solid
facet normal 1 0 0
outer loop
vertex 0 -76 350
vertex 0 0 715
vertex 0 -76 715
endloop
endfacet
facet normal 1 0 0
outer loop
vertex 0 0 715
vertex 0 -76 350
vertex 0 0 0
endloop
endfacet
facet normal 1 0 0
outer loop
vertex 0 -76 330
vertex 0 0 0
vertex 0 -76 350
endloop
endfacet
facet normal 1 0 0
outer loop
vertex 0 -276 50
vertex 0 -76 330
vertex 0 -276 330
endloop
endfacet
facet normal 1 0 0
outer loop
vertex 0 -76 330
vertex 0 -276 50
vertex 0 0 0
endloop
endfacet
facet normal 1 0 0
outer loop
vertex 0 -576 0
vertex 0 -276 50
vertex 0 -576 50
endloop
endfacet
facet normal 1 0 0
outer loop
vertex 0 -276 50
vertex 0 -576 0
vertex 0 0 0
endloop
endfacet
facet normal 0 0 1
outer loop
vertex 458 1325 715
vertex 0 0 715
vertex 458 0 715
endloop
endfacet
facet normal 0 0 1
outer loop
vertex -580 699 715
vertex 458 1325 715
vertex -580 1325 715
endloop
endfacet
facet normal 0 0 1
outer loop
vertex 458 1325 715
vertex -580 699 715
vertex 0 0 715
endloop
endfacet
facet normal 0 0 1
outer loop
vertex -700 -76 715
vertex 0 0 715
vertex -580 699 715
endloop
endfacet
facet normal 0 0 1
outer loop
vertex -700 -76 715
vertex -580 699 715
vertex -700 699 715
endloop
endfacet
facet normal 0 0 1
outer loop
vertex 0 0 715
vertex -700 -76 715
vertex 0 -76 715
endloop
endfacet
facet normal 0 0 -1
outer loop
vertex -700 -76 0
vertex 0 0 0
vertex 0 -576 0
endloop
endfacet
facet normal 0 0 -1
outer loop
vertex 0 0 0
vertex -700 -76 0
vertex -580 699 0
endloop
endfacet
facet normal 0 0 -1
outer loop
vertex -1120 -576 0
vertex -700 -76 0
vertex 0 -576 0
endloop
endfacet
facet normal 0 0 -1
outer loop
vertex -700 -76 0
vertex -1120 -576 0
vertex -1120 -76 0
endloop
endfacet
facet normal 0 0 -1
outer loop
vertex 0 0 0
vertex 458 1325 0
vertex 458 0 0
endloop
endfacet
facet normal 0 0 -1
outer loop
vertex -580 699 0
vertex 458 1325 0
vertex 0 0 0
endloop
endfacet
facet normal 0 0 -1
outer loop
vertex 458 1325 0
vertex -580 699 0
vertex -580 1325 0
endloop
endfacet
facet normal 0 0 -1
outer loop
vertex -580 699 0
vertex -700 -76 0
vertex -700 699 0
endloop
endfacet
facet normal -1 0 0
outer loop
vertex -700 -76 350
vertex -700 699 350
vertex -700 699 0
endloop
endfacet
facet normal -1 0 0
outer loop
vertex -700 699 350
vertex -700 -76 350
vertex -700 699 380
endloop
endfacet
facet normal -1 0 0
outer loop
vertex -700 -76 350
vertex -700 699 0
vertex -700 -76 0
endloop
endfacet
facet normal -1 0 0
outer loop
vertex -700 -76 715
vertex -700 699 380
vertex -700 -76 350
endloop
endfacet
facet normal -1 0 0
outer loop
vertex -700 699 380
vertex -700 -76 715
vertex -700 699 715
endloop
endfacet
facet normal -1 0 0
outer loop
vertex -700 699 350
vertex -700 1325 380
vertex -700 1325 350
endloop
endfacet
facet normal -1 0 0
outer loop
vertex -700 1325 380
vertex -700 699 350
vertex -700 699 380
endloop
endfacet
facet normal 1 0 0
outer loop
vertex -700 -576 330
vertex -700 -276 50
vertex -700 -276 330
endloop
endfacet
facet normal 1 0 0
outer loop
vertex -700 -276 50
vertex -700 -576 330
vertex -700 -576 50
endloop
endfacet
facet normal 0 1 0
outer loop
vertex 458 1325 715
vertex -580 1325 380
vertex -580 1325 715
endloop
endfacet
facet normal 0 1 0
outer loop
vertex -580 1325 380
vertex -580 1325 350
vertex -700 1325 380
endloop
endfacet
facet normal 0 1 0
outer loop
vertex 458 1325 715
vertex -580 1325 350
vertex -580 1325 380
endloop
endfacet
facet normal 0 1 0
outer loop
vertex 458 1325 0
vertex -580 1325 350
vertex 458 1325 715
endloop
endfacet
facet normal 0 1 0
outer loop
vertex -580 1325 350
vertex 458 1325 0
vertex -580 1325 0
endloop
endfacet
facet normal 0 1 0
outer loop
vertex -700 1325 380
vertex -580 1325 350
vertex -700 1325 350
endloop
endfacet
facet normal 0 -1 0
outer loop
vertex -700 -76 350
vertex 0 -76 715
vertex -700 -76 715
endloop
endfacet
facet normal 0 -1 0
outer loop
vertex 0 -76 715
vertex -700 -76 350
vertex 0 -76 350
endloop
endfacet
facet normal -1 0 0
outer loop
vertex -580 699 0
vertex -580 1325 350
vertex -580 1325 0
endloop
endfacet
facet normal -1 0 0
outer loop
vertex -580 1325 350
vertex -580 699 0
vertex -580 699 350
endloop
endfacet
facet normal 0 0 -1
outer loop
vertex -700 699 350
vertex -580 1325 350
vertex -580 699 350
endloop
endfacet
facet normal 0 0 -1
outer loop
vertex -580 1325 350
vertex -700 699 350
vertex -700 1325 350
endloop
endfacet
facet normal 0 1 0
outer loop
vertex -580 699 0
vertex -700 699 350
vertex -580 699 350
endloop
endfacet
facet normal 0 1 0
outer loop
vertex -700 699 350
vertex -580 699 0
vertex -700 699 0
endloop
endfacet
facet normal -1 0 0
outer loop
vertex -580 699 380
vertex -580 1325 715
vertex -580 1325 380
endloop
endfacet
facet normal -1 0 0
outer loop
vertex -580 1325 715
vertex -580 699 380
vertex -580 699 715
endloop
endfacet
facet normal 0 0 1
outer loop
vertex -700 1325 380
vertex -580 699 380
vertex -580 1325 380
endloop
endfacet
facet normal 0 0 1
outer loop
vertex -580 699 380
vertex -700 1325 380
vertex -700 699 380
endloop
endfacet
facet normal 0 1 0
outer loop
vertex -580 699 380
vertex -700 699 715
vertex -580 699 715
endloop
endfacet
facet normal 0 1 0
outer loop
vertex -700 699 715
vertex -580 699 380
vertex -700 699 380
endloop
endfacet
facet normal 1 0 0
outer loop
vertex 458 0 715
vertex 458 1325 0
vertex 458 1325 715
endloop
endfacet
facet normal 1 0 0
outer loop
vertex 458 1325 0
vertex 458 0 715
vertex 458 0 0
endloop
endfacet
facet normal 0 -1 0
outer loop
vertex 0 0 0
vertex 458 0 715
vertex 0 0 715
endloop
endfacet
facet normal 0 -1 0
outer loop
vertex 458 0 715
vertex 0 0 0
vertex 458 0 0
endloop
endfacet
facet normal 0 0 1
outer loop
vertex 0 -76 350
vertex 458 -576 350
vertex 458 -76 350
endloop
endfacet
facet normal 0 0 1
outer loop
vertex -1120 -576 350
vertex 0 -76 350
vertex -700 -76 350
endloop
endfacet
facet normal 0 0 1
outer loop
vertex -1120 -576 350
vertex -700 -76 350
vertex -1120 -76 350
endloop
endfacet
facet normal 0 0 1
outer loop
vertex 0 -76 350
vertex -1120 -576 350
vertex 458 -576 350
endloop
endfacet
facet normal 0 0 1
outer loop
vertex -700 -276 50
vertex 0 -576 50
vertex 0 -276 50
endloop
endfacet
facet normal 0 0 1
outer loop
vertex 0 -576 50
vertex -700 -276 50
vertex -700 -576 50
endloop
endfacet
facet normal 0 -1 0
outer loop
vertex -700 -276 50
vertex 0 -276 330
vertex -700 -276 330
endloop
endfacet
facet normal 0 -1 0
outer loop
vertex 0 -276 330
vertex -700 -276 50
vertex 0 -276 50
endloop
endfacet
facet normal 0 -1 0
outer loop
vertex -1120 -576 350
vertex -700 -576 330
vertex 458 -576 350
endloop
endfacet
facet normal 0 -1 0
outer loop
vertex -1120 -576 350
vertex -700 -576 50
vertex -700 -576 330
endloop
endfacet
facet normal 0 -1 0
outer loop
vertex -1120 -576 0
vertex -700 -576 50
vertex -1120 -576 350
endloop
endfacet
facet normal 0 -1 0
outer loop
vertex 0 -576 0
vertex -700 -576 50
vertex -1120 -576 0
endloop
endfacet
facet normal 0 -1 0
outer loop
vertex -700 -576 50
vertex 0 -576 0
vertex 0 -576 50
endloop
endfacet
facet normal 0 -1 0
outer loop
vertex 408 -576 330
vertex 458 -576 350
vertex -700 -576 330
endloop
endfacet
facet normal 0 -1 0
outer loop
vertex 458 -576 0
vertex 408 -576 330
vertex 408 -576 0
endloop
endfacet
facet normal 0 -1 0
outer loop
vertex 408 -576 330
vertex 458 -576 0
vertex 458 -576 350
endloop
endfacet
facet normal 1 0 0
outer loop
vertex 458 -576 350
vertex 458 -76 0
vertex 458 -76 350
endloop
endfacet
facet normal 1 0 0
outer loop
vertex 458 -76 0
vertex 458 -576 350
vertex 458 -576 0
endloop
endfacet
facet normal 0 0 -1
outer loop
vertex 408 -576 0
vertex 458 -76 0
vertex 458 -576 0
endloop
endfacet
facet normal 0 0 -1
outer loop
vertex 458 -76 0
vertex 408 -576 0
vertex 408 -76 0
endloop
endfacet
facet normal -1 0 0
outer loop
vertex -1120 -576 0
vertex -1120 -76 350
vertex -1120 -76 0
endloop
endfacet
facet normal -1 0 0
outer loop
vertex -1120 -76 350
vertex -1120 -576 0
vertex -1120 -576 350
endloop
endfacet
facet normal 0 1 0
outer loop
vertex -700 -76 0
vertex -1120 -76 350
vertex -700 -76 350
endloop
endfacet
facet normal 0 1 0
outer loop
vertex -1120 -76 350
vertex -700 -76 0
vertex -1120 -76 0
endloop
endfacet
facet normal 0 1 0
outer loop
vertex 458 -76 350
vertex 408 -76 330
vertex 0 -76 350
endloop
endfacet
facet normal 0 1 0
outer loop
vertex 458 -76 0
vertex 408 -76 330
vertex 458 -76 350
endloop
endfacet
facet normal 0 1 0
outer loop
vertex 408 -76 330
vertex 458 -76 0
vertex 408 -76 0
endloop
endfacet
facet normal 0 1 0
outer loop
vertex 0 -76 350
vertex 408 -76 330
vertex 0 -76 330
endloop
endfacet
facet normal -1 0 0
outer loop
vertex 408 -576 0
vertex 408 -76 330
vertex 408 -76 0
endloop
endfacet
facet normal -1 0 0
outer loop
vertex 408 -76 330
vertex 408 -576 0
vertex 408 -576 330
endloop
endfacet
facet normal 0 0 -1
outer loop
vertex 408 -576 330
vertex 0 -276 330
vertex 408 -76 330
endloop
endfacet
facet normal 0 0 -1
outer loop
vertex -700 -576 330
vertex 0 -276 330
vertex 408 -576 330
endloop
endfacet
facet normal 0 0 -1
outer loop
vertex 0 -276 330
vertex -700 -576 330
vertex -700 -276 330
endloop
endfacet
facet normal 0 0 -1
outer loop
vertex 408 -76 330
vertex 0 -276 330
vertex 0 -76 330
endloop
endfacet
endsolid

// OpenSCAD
haz_m = 715;
haz_j_h = 1325;
haz_j_sz = 458;
haz_b_h = haz_j_h + 76;
haz_b_sz = 700;
beugro_h = 670;
beugro_sz = 120;
beugro_m = 350;

lepcso_szelesseg = 120;

apa=true;

//alsoszint();

elotetovel();


module alsoszint(){
    difference(){
        haz();
        translate([-haz_b_sz, -76, beugro_m])cube([15000,15000,400]);
        konyha();
        translate([haz_j_sz-42-416, 42+417,50])translate([])cube([416, 16+316+21+471, 350]);
        translate([-616-42, -76+42, 50])cube([616, 250,350]);  // Lépcsőház
        nappali();
        translate([-616-42, -76+42+250,50])cube([200, 42, 240]); //kivágás a lépcsőnél
        translate([-200-42, -76+42+250,50])cube([200, 42, 240]); //kivágás a bejárattal szemben
        hatso_traktus();
        bejarati_ajto();
        nappali_ajto();
        nappali_kicsi_ablakok();
        ujKonyha_ablakok();
        ujhatso_ajto();
        hatso_ajto();
        halo_ablak();
        if (apa){
            gyerekszoba_oldalablak();
        }
        gyerekszoba_hatsoablak();
        hatso_terasz();
    }
    translate([-haz_b_sz+lepcso_szelesseg+42,290-76+42,50])rotate([0,0,180])lepcso(tomor=false);
    translate([-41-200-100, -76+42+250+21, 350])cylinder(r=10, h=200);
    szennyesledobo();
}

module ujKonyha_ablakok(){
    translate([-55-483,-76+775+364+42+10,50+240])rotate([0,0,90])cube([150,42,40]);
    translate([-483,-76+haz_b_h-42,50+240])rotate([0,0,0])cube([200,42,40]);
}

module kulso_latvany(){
    difference(){
        elotetovel();
        nappali();
        nappali_ajto();
        hatso_traktus();
        nappali_kicsi_ablakok();
        bejarati_ajto();
    }
}


module konyha(){
    translate([haz_j_sz-42-416, 42,50])cube([416, 417,350]); // Konyha
}
module gyerekszoba_oldalablak(){
    translate([haz_j_sz-42,150+361+292+259-75,50])rotate([0,0,-90])cube([65,42,240]);
}

module hatso_terasz(jatszo_oldala_kiutve = true){
    if (jatszo_oldala_kiutve){
        translate([-42,-76+775+364+42,50])cube([42,178,240]);
        translate([-496-42,-76+775+364+42,50])cube([496,178,310]);
    }
    else
        translate([-496-42,-76+775+364+42,50])cube([496,178,310]);
}
module gyerekszoba_hatsoablak(){
    if (apa){
        szelso_eltolas = 38+40;//haz_j_sz-240-138;
        for(dx = [szelso_eltolas, szelso_eltolas+65+22.5, szelso_eltolas+65+22.5 +65+22.5]){
            translate([dx, -76+haz_b_h-42, 50])cube([65, 42, 240]);
        }
    }
    else{
        translate([haz_j_sz-240-138, -76+haz_b_h-42, 50])cube([240, 42, 240]);
    }
}
module ujhatso_ajto(){
    translate([-100-42-10, -76+haz_b_h-42, 50])cube([100,42,240]);
}

module hatso_ajto(){
    translate([-100-42-10, -76+haz_b_h-42-178-42, 50])cube([100,42,240]);
}

module szennyesledobo(){
    translate([285+10,42+417,0])cube([30,30,600]);
}

module halo_ablak(){ // régi konyha ablak
    for(x = [38+40, 38+40+65+22.5])
        translate([x,0,50])cube([65,42,240]);
}

module nappali_kicsi_ablakok(){
    if (apa){
        for(dy = [10,10+126,10+252]){
                translate([-55-483,-76+167+380+228+dy, 50])rotate([0,0,90])cube([65,43,240]);
        }
    }
    else{
        translate([-55-483,-76+167+380+228+86, 50])rotate([0,0,90])cube([250,43,240]);
    }
}

module nappali(){
    translate([-616-42, -76+42+250+42,50])cube([616, 401, 350]); //nappali
}

module hatso_traktus(){
    translate([-496-42,-76+42+250+42+401,50])cube([496,100+12+282+12,350]);
}

module bejarati_ajto(){
    translate([-140-96,-76,50])cube([140,42,240]); //Bejárati ajtó
}

module nappali_ajto(){
    if (apa){
        translate([-616-42,-76+42+250+145,50])rotate([0,0,90])cube([220,42,240]);
    }
    else {
        translate([-616-42,-76+42+250+145,150])rotate([0,0,90])cube([220,42,140]);
    }
}

module lepcso(tomor=true){
    
    lepcsohaz_magassag = 300;
    lepcsohaz_szelesseg = 290;
    lepcsofok_melyseg = 30;
    lepesek = 20;
    lepcsok_a_sarokban = 3;
    lepcsofok_magassag = 15;
    
    lepes_magassag = lepcsohaz_magassag / lepesek;
    n_also_lepcsok = floor((lepcsohaz_szelesseg - lepcso_szelesseg) / lepcsofok_melyseg);

    echo(n_also_lepcsok);

    // Alsó rész
    offset_a_sarok_fele = lepcsohaz_szelesseg - lepcso_szelesseg - n_also_lepcsok * lepcsofok_melyseg;// betoljuk, ha kell, ha a saroknál ne legyen extra hézag. A lépcsők számának lefele kerekítése miatt alakul ki a rés
    translate([0,offset_a_sarok_fele, 0])egyenes_lepcsok(n_also_lepcsok, teli=tomor);
    echo("Lépcsőház mérete a üvegfel oldalán: ", lepcsohaz_szelesseg - offset_a_sarok_fele);

    // Forduló
    translate([0,lepcsohaz_szelesseg - lepcso_szelesseg,(n_also_lepcsok -1)* lepes_magassag])    
        for(i = [1 : lepcsok_a_sarokban]){
            translate([0,0, i*lepes_magassag])sarok_lepcsofok(i);
        }

    // Felső lépcsők
    n_felso_lepcsok = floor((lepcsohaz_magassag - (n_also_lepcsok + lepcsok_a_sarokban) * lepes_magassag)/lepes_magassag);
    echo(n_felso_lepcsok);
    echo("Lépcsőház mérete a bejárati ajtó falán: ", lepcso_szelesseg + lepcsofok_melyseg * n_felso_lepcsok);

    translate([0,lepcsohaz_szelesseg - lepcso_szelesseg, 0]){
        translate([0,0,(n_also_lepcsok + lepcsok_a_sarokban) * lepes_magassag])
            rotate([0,0,90]) egyenes_lepcsok(n_felso_lepcsok, teli=tomor);
        if (tomor){
            also_x = n_felso_lepcsok * lepcsofok_melyseg;
            translate([-also_x,0,0])cube([also_x,lepcso_szelesseg, (n_also_lepcsok + lepcsok_a_sarokban) * lepes_magassag]);
        }
    }




    module egyenes_lepcsok(n, teli=false){
        for(i = [0: n-1]){
            if (teli) 
                translate([0, i*lepcsofok_melyseg, 0])lepcsofok(m=(i+1)*lepes_magassag);
            else
                translate([0, i*lepcsofok_melyseg, i*lepes_magassag])lepcsofok();
        }
    }


    module lepcsofok(m = lepcsofok_magassag){
        cube([lepcso_szelesseg, lepcsofok_melyseg, m]);
    }


    module sarok_lepcsofok(i){
        szog = 90 / lepcsok_a_sarokban;
        
        forgatas_szoge = (i - 1) * szog;
        szog2 = i * szog;
        elhossz = 2 * lepcso_szelesseg; // valójában a sqrt(2)-vel elég lenne szorozni. Így biztosan kilóg
        intersection(){
            cube([lepcso_szelesseg, lepcso_szelesseg, lepcsofok_magassag]);
            pontok = [[0,0],[cos(forgatas_szoge), sin(forgatas_szoge)],[cos(szog2), sin(szog2)]];
            //echo(lepcso_szelesseg * pontok[2]);
            echo(lepcso_szelesseg * tan(forgatas_szoge));
            linear_extrude(height=lepcsofok_magassag){
                polygon(points = elhossz * pontok);
            }
        }
    }
}

module elotetovel(){
    //garage_fodem_h = beugro_m - 46;
    
    haz();
    //translate([-991+haz_j_sz, haz_j_h+846,0])garage();
    //translate([-haz_b_sz,haz_j_h,garage_fodem_h+15*2])rotate([-5,0,0])cube([haz_b_sz,846,50]);
    // Ház és garázs közti tető
    //translate([-haz_b_sz,haz_j_h,beugro_m-44])rotate([-0,0,0])cube([haz_b_sz,900,50]);
    
    

    module garage(){
        
        cube([991, 665, garage_fodem_h]);
        translate([0,(665-725)/2,garage_fodem_h])rotate([90,0,90])linear_extrude(height=1000)polygon(points=[[0,0], [725,0],[725/2, 725/2]]);
    }


    kertfelol_sz = 420;
    atjaro_sz = 0;
    eloteto_sz = haz_j_sz + haz_b_sz + kertfelol_sz;
    eloteto_m = 500;
    eloteto_vastagsag = 50;
    translate([-haz_b_sz-kertfelol_sz,-76-eloteto_m,0]){
        tarolo_elotti_fal_vastagsag = 30;
        tarolo_elotti_fal_sz = 00;
        difference(){
            cube([eloteto_sz, eloteto_m, beugro_m]);
            translate([kertfelol_sz - atjaro_sz,tarolo_elotti_fal_vastagsag, 0])cube([eloteto_sz - (kertfelol_sz - atjaro_sz)-eloteto_vastagsag, eloteto_m-tarolo_elotti_fal_vastagsag, beugro_m-20]);
            translate([kertfelol_sz - atjaro_sz+tarolo_elotti_fal_sz,0, 0])cube([eloteto_sz - (kertfelol_sz - atjaro_sz)-eloteto_vastagsag - tarolo_elotti_fal_sz, eloteto_m-tarolo_elotti_fal_vastagsag, beugro_m-20]);
            echo("Belépő áthidalás hossza:", eloteto_sz - (kertfelol_sz - atjaro_sz)-eloteto_vastagsag - tarolo_elotti_fal_sz);
            echo("Házfelöli áthidalás hossza:", eloteto_sz - (kertfelol_sz - atjaro_sz)-eloteto_vastagsag);
        }
    }
    // oldalsó terasz
    //translate([-(kertfelol_sz + haz_b_sz), -76,0])cube([kertfelol_sz + beugro_sz, haz_b_h, 50]);
}

module haz(){
    cube([haz_j_sz, haz_j_h ,haz_m]);
    translate([-haz_b_sz, -76,0])difference(){
        cube([haz_b_sz, haz_b_h ,haz_m]);
        //Erkély alatti rész
        translate([0,775,0])cube([beugro_sz, beugro_h, beugro_m]);
        // Erkély felső kivágás
        translate([0,775,beugro_m+30])cube([beugro_sz, beugro_h, beugro_m]);
    }
    //Első terasz beépítés
    translate([-haz_b_sz, -200-76,50])cube([haz_b_sz, 200,300]);
    // Első terasz
    translate([-haz_b_sz, -500-76,0])cube([haz_b_sz, 500, 50]);
}
